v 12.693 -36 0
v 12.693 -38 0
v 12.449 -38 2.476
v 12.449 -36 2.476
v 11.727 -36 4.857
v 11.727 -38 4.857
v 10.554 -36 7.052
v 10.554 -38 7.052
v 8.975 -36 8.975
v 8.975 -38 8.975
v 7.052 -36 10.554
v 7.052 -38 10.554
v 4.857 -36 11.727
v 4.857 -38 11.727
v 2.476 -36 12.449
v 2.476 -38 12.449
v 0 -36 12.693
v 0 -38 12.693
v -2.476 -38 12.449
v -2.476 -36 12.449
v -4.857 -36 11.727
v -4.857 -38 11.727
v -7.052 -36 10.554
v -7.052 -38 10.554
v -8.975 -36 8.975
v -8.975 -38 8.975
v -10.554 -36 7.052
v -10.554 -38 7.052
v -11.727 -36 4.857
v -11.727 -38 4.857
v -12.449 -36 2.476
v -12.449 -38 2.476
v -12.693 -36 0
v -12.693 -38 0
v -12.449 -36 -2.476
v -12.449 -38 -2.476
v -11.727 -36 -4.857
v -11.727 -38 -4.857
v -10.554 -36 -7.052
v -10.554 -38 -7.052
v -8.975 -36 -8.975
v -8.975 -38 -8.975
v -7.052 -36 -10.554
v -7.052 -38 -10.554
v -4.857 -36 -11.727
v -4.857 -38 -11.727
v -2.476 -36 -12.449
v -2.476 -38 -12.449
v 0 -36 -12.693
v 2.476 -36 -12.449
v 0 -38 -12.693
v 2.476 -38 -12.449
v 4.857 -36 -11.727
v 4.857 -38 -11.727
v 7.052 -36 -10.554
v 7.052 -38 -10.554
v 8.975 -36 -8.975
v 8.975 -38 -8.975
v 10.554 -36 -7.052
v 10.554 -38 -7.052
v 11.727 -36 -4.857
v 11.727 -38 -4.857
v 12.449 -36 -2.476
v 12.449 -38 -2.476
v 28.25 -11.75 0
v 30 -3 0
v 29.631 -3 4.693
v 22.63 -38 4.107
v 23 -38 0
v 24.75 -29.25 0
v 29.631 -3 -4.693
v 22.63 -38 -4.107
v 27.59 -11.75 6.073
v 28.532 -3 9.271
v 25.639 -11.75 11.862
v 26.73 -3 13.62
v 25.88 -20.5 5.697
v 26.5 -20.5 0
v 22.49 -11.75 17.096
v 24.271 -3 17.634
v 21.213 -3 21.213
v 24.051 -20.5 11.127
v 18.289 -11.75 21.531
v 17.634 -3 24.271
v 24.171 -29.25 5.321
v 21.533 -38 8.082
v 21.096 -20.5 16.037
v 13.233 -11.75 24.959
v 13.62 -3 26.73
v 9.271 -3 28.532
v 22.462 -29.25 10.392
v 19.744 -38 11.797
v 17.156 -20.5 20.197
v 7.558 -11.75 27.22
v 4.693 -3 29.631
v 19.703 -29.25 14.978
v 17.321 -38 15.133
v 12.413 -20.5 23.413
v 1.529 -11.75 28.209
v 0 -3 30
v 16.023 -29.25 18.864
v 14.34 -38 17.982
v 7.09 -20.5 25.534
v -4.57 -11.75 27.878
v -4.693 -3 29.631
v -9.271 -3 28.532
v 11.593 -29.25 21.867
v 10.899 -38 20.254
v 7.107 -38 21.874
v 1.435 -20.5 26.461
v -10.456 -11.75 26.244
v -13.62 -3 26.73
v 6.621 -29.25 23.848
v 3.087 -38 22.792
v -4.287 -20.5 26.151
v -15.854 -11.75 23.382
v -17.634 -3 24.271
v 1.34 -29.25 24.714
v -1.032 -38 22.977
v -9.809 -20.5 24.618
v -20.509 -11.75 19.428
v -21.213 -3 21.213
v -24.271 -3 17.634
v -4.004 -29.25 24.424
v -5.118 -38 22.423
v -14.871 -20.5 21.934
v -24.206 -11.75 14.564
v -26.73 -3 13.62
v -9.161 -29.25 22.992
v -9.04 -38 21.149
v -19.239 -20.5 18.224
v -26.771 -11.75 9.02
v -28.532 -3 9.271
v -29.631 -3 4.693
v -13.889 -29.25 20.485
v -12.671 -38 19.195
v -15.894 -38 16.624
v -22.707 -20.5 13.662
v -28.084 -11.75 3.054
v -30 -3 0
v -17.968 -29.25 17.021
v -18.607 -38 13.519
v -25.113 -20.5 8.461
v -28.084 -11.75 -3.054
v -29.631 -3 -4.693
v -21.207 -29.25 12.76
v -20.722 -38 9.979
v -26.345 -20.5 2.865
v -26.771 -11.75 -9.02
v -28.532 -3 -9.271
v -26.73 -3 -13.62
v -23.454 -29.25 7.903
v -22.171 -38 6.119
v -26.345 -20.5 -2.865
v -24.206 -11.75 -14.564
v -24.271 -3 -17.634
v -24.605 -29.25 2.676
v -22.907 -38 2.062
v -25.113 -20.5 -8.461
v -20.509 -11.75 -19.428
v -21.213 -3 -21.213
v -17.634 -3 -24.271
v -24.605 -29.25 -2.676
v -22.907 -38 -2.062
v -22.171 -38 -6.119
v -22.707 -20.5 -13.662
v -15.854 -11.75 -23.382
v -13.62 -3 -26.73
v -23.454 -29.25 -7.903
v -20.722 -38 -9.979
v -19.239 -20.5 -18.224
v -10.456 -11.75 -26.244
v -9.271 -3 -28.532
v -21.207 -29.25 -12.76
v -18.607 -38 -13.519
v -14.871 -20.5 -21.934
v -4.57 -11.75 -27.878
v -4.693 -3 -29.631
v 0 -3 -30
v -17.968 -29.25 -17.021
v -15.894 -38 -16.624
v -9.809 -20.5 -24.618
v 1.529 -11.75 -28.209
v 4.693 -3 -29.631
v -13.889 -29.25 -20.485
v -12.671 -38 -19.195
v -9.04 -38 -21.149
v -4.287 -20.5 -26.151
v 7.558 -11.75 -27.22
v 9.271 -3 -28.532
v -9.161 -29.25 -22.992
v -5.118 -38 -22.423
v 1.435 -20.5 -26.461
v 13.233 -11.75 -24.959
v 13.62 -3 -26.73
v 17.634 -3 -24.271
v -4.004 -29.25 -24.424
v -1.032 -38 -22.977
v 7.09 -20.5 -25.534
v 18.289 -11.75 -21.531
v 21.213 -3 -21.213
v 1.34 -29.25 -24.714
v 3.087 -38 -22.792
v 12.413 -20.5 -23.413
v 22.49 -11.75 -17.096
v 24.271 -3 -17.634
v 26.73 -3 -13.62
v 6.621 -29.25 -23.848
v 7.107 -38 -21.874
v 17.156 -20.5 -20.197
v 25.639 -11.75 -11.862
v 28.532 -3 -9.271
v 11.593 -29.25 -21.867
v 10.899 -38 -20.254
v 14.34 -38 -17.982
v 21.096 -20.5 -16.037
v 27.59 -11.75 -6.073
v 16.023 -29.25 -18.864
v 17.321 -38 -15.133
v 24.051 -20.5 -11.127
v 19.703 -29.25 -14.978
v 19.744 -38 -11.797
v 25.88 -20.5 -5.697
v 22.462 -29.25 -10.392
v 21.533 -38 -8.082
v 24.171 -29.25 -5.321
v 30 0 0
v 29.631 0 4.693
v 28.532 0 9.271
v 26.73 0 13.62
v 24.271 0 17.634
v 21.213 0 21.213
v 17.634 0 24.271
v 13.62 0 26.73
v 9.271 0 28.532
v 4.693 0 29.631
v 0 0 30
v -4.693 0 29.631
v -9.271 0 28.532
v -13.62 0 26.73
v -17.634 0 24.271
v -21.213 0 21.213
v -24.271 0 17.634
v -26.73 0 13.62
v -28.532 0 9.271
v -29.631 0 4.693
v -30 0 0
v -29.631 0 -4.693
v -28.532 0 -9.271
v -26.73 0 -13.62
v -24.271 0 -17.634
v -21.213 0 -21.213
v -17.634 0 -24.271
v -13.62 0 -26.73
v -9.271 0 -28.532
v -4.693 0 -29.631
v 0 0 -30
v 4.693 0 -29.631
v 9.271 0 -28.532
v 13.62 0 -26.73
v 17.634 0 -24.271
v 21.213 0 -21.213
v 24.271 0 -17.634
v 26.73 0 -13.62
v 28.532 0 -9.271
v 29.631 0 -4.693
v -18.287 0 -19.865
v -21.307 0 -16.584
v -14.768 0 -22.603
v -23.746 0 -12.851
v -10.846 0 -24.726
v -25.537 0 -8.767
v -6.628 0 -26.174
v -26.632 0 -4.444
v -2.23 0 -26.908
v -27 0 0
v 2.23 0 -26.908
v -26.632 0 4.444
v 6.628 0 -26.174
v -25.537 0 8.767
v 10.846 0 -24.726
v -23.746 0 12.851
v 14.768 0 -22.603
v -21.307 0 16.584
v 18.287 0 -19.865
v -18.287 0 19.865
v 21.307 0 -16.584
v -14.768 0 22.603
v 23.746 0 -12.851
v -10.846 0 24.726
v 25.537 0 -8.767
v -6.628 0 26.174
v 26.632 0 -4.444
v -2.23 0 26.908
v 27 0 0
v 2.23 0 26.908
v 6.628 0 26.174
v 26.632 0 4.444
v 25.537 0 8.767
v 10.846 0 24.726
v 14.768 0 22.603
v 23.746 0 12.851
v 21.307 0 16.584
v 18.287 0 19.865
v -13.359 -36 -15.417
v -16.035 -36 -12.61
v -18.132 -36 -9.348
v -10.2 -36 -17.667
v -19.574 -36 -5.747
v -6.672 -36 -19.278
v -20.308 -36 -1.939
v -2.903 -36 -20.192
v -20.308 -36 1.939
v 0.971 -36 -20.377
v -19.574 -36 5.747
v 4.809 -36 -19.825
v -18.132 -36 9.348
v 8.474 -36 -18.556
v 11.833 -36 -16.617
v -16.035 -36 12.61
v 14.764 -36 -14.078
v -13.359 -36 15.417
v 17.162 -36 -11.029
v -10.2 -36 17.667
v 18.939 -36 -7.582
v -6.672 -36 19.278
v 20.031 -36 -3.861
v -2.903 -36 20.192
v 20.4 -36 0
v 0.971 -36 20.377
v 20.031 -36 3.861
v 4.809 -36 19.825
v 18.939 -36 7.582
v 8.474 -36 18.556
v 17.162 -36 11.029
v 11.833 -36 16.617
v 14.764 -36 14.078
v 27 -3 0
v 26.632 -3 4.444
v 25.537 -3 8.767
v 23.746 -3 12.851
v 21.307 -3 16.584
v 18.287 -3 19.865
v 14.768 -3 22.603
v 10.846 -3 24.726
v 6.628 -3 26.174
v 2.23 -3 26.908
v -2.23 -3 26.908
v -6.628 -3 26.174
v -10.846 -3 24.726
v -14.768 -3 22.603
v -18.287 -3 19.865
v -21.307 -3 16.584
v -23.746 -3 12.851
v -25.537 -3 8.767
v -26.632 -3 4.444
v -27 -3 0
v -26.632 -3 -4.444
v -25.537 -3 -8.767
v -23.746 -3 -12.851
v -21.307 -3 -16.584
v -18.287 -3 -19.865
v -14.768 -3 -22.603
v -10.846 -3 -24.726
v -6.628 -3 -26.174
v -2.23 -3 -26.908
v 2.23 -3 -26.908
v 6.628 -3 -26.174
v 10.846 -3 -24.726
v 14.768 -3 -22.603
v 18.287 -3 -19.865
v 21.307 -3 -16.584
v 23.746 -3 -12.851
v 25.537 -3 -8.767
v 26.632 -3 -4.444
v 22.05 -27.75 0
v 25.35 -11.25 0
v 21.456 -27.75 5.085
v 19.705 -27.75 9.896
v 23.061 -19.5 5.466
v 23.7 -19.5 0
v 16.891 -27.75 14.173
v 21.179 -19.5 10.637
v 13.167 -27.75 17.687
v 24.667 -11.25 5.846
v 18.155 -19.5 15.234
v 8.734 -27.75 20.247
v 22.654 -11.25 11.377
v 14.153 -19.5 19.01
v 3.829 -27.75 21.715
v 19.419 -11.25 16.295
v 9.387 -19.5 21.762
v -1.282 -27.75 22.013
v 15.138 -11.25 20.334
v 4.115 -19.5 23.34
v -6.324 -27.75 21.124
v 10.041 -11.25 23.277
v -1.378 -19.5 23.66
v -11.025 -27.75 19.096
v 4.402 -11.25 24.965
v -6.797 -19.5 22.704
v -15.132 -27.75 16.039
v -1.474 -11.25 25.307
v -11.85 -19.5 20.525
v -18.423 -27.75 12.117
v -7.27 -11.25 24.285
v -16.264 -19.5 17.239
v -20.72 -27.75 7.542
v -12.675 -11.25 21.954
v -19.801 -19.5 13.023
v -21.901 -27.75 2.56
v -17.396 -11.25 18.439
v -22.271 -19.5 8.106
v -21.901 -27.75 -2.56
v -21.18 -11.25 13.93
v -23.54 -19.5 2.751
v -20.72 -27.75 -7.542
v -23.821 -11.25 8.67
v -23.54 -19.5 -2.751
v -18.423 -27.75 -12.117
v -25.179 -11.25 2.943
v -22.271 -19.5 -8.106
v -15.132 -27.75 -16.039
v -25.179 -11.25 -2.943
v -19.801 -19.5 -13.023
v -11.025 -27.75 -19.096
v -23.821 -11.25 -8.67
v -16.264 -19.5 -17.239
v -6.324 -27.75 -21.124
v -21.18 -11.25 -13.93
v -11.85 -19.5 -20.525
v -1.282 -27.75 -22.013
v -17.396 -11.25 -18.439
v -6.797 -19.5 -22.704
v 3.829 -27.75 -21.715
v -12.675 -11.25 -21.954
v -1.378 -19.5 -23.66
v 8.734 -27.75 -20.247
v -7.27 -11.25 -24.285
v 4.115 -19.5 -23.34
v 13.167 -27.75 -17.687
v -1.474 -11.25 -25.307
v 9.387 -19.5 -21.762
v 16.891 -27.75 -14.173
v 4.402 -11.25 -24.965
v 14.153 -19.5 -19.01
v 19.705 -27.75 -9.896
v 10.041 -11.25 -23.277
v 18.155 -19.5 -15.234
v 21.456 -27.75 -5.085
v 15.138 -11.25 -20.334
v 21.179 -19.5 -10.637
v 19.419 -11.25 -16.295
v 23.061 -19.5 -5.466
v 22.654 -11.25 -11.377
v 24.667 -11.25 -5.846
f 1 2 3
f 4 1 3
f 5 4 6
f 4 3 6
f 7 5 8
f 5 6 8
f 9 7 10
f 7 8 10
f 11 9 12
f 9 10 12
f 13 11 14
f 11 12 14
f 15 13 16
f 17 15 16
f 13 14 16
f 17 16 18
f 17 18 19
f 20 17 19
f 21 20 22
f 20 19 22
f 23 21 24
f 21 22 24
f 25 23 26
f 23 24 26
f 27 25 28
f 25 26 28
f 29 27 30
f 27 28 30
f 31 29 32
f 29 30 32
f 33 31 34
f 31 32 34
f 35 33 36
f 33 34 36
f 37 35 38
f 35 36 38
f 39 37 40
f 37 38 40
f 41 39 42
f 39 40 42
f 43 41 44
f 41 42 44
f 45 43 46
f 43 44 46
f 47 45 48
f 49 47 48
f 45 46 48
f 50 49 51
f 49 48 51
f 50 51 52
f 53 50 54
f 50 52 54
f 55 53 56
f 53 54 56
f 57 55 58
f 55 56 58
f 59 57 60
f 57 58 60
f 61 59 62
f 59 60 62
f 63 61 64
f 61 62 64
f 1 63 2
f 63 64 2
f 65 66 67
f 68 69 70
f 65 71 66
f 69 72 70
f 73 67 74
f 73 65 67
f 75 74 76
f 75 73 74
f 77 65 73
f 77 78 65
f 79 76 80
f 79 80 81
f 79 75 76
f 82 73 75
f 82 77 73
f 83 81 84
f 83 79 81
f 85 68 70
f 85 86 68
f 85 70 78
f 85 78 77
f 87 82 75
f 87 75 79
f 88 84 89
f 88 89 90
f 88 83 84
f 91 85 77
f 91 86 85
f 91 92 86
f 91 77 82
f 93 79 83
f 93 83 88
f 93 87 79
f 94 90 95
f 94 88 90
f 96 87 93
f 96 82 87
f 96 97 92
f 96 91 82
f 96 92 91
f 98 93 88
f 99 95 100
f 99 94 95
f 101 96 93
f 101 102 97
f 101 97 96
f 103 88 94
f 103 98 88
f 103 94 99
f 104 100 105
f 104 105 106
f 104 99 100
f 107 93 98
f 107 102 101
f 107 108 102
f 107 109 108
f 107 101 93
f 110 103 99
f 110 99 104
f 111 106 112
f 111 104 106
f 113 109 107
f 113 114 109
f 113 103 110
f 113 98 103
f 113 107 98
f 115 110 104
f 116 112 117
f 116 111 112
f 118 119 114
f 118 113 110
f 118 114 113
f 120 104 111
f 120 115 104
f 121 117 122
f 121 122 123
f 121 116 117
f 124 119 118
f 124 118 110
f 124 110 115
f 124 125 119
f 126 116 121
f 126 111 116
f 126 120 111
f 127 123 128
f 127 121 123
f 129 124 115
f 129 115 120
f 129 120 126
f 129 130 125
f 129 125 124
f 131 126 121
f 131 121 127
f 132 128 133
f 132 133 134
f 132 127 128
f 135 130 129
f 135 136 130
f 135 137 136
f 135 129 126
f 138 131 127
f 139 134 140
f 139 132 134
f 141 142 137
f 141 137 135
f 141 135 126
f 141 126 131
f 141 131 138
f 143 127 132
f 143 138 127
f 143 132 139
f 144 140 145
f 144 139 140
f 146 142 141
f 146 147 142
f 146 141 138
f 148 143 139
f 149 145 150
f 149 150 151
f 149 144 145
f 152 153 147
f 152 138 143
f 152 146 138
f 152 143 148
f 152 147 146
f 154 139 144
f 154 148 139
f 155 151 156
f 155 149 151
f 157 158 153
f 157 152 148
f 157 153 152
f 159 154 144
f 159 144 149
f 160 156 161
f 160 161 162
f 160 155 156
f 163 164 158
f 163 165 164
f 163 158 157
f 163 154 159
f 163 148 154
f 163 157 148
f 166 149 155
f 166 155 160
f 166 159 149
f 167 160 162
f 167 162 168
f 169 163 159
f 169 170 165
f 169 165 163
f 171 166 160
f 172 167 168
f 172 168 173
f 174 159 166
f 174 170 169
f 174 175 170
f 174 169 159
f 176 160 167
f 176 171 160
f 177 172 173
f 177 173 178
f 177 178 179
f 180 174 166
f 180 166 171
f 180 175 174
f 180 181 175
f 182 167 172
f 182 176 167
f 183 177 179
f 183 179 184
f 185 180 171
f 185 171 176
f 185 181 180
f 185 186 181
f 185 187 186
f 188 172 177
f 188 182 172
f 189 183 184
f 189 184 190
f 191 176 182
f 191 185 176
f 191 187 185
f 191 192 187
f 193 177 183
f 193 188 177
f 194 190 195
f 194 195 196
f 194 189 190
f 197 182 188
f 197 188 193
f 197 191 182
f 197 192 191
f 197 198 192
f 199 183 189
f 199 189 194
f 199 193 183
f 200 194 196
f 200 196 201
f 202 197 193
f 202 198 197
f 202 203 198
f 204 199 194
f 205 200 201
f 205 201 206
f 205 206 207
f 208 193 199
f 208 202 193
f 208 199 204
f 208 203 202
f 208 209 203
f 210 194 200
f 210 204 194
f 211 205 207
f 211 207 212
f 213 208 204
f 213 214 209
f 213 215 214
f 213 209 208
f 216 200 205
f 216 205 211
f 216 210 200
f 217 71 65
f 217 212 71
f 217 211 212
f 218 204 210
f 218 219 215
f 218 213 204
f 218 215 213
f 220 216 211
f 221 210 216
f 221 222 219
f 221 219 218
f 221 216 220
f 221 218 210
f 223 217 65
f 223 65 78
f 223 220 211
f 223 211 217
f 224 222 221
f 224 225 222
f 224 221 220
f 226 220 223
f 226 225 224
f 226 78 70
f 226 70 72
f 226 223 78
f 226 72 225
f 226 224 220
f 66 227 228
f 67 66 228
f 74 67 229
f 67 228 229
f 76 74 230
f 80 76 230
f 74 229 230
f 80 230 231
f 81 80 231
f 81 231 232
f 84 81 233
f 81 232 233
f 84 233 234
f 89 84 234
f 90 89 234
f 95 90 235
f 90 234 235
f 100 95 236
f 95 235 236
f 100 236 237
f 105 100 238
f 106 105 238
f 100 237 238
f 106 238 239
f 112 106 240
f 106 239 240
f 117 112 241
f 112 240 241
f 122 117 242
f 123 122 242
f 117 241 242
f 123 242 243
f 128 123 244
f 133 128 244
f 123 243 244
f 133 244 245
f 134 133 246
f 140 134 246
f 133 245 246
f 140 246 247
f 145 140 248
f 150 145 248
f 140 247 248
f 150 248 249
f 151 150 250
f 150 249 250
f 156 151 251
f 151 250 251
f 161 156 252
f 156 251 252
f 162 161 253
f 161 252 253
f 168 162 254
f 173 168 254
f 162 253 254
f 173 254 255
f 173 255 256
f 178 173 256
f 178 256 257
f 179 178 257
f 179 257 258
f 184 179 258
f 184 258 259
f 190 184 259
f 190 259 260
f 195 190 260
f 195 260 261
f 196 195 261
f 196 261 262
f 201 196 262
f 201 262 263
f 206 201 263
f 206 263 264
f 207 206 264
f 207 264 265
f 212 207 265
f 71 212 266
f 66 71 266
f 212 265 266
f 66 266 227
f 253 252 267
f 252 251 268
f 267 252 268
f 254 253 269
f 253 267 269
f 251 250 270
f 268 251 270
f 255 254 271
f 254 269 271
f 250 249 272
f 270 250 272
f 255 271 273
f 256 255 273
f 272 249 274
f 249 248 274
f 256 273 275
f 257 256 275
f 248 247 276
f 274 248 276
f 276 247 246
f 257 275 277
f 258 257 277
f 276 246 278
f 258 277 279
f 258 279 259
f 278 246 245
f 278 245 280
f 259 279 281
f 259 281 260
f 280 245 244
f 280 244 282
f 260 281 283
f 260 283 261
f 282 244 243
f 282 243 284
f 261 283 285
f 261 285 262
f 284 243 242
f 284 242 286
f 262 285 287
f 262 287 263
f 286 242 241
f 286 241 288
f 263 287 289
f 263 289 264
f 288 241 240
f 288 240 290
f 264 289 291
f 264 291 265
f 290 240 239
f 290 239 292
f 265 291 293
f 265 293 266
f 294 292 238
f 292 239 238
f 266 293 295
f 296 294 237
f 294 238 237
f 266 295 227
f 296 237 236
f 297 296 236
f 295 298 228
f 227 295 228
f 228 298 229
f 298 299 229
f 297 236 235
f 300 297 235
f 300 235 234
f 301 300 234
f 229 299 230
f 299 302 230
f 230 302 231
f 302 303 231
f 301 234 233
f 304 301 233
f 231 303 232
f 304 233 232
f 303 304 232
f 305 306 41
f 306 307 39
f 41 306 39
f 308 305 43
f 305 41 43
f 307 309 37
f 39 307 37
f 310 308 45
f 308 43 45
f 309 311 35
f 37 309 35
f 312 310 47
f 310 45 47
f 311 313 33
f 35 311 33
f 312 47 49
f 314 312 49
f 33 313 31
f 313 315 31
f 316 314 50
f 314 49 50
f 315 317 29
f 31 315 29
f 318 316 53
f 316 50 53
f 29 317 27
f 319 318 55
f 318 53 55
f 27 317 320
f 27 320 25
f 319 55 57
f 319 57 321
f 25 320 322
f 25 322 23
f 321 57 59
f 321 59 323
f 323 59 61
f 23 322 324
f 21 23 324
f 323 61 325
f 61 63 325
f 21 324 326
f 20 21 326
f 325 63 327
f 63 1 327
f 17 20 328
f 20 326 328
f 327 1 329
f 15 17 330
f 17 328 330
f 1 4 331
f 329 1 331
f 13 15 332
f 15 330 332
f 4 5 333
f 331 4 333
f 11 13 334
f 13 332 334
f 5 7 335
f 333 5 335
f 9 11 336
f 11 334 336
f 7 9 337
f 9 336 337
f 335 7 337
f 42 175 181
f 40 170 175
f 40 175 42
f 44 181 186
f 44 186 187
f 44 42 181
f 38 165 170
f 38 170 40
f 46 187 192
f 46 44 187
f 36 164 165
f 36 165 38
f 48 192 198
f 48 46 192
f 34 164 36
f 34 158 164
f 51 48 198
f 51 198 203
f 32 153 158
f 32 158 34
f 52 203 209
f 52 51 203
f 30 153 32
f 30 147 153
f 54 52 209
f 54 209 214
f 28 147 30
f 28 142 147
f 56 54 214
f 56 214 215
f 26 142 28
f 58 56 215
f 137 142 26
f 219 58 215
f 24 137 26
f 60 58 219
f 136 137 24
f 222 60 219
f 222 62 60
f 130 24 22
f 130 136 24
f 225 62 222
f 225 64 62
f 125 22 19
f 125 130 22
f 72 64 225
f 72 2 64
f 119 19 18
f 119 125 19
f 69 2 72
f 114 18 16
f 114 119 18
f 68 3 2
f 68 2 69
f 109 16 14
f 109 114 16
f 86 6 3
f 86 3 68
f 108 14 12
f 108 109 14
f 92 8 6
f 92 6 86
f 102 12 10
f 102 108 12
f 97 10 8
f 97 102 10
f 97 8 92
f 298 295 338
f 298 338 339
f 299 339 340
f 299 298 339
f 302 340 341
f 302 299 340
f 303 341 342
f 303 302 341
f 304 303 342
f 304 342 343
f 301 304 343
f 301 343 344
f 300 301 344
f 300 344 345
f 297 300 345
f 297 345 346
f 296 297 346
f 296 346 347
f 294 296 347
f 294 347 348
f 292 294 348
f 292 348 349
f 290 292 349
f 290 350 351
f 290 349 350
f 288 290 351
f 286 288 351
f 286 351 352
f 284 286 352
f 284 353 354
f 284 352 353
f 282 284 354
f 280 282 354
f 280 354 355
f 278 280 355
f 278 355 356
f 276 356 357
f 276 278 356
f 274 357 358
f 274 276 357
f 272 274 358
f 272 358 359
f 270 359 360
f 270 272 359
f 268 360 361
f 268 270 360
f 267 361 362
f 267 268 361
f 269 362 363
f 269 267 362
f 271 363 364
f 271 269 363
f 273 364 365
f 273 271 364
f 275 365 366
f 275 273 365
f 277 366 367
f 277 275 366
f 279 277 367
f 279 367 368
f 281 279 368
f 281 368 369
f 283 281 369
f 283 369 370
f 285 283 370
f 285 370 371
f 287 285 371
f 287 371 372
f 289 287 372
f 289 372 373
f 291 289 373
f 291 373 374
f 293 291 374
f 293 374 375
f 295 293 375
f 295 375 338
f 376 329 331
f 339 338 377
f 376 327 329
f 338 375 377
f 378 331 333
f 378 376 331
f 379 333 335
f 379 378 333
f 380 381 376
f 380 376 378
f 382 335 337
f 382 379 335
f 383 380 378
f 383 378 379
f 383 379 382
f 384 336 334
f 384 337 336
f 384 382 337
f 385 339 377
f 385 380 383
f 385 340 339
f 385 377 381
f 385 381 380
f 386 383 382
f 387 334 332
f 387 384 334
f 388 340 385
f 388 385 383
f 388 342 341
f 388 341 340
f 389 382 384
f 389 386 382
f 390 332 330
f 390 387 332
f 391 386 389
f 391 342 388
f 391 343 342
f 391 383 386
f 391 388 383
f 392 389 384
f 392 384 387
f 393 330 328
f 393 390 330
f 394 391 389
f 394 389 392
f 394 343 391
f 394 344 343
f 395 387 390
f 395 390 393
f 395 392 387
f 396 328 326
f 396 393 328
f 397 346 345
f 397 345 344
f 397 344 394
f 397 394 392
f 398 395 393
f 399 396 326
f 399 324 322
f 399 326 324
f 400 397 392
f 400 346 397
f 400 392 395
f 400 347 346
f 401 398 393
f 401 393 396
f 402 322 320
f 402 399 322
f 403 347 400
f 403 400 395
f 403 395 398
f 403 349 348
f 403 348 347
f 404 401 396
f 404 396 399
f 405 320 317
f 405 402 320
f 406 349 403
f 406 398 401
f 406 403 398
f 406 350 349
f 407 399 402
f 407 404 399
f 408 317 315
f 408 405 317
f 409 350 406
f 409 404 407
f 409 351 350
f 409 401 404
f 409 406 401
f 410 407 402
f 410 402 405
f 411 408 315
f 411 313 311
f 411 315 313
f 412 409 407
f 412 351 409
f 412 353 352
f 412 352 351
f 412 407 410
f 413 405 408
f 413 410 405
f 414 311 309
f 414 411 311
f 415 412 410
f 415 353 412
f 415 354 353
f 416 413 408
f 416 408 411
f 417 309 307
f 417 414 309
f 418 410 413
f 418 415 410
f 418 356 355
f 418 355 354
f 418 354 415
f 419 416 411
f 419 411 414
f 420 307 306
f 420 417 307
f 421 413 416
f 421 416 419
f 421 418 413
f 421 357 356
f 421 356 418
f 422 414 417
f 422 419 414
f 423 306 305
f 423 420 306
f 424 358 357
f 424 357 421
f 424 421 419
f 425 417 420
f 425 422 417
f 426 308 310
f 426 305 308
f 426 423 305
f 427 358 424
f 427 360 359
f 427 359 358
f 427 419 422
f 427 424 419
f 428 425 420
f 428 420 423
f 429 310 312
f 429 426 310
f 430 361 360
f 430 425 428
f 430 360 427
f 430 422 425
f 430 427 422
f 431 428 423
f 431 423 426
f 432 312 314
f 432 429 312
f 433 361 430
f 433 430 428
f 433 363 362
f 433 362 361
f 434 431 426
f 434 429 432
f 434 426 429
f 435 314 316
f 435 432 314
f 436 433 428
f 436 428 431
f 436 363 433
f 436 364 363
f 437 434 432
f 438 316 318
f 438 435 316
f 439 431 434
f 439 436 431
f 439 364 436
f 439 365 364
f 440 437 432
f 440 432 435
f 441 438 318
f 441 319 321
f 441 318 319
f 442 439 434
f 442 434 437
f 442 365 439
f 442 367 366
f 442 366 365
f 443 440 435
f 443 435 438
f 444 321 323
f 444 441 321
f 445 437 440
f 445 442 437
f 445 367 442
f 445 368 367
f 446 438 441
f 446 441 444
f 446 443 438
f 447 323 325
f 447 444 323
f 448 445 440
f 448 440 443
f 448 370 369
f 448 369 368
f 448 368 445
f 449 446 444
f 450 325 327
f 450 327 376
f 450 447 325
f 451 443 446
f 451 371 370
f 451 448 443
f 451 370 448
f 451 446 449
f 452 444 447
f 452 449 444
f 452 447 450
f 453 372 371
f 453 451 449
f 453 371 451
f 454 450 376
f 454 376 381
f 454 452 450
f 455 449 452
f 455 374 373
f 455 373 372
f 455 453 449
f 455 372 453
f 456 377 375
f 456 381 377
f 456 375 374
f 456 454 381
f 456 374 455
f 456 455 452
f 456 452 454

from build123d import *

# Parameters (mm, degrees)
F0_R      = 30
F0_R_2    = 27
F1_DEPTH  = 3
F4_R      = 30
F3_R      = 23
F7_R      = 20
F6_R      = 27
F9_R      = 22.403667
F9_R_2    = 12.693191
F10_DEPTH = 2


with BuildPart() as f1:
    # F0 (on Front) → F1 (new body)
    with BuildSketch(Plane.XZ):
        Circle(F0_R)
        Circle(F0_R_2, mode=Mode.SUBTRACT)
    extrude(amount=F1_DEPTH)

    # F4 (on face) → F5 section 0
    with BuildSketch(Plane.XZ.offset(3)):
        Circle(F4_R)
    # F3 (on offset) → F5 section 1
    with BuildSketch(Plane.XZ.offset(38)):
        Circle(F3_R)
    loft()

    # F7 (on face) → F8 section 0
    with BuildSketch(Plane.XZ.offset(38)):
        Circle(F7_R)
    # F6 (on face) → F8 section 1
    with BuildSketch(Plane(origin=(0, -3, 0), x_dir=(-1, 0, 0), z_dir=(0, 1, 0))):
        Circle(F6_R)
    loft(mode=Mode.SUBTRACT)

    # F9 (on face) → F10 (join)
    with BuildSketch(Plane.XZ.offset(38)):
        Circle(F9_R)
        Circle(F9_R_2, mode=Mode.SUBTRACT)
    extrude(amount=-F10_DEPTH)


solid = f1.part
